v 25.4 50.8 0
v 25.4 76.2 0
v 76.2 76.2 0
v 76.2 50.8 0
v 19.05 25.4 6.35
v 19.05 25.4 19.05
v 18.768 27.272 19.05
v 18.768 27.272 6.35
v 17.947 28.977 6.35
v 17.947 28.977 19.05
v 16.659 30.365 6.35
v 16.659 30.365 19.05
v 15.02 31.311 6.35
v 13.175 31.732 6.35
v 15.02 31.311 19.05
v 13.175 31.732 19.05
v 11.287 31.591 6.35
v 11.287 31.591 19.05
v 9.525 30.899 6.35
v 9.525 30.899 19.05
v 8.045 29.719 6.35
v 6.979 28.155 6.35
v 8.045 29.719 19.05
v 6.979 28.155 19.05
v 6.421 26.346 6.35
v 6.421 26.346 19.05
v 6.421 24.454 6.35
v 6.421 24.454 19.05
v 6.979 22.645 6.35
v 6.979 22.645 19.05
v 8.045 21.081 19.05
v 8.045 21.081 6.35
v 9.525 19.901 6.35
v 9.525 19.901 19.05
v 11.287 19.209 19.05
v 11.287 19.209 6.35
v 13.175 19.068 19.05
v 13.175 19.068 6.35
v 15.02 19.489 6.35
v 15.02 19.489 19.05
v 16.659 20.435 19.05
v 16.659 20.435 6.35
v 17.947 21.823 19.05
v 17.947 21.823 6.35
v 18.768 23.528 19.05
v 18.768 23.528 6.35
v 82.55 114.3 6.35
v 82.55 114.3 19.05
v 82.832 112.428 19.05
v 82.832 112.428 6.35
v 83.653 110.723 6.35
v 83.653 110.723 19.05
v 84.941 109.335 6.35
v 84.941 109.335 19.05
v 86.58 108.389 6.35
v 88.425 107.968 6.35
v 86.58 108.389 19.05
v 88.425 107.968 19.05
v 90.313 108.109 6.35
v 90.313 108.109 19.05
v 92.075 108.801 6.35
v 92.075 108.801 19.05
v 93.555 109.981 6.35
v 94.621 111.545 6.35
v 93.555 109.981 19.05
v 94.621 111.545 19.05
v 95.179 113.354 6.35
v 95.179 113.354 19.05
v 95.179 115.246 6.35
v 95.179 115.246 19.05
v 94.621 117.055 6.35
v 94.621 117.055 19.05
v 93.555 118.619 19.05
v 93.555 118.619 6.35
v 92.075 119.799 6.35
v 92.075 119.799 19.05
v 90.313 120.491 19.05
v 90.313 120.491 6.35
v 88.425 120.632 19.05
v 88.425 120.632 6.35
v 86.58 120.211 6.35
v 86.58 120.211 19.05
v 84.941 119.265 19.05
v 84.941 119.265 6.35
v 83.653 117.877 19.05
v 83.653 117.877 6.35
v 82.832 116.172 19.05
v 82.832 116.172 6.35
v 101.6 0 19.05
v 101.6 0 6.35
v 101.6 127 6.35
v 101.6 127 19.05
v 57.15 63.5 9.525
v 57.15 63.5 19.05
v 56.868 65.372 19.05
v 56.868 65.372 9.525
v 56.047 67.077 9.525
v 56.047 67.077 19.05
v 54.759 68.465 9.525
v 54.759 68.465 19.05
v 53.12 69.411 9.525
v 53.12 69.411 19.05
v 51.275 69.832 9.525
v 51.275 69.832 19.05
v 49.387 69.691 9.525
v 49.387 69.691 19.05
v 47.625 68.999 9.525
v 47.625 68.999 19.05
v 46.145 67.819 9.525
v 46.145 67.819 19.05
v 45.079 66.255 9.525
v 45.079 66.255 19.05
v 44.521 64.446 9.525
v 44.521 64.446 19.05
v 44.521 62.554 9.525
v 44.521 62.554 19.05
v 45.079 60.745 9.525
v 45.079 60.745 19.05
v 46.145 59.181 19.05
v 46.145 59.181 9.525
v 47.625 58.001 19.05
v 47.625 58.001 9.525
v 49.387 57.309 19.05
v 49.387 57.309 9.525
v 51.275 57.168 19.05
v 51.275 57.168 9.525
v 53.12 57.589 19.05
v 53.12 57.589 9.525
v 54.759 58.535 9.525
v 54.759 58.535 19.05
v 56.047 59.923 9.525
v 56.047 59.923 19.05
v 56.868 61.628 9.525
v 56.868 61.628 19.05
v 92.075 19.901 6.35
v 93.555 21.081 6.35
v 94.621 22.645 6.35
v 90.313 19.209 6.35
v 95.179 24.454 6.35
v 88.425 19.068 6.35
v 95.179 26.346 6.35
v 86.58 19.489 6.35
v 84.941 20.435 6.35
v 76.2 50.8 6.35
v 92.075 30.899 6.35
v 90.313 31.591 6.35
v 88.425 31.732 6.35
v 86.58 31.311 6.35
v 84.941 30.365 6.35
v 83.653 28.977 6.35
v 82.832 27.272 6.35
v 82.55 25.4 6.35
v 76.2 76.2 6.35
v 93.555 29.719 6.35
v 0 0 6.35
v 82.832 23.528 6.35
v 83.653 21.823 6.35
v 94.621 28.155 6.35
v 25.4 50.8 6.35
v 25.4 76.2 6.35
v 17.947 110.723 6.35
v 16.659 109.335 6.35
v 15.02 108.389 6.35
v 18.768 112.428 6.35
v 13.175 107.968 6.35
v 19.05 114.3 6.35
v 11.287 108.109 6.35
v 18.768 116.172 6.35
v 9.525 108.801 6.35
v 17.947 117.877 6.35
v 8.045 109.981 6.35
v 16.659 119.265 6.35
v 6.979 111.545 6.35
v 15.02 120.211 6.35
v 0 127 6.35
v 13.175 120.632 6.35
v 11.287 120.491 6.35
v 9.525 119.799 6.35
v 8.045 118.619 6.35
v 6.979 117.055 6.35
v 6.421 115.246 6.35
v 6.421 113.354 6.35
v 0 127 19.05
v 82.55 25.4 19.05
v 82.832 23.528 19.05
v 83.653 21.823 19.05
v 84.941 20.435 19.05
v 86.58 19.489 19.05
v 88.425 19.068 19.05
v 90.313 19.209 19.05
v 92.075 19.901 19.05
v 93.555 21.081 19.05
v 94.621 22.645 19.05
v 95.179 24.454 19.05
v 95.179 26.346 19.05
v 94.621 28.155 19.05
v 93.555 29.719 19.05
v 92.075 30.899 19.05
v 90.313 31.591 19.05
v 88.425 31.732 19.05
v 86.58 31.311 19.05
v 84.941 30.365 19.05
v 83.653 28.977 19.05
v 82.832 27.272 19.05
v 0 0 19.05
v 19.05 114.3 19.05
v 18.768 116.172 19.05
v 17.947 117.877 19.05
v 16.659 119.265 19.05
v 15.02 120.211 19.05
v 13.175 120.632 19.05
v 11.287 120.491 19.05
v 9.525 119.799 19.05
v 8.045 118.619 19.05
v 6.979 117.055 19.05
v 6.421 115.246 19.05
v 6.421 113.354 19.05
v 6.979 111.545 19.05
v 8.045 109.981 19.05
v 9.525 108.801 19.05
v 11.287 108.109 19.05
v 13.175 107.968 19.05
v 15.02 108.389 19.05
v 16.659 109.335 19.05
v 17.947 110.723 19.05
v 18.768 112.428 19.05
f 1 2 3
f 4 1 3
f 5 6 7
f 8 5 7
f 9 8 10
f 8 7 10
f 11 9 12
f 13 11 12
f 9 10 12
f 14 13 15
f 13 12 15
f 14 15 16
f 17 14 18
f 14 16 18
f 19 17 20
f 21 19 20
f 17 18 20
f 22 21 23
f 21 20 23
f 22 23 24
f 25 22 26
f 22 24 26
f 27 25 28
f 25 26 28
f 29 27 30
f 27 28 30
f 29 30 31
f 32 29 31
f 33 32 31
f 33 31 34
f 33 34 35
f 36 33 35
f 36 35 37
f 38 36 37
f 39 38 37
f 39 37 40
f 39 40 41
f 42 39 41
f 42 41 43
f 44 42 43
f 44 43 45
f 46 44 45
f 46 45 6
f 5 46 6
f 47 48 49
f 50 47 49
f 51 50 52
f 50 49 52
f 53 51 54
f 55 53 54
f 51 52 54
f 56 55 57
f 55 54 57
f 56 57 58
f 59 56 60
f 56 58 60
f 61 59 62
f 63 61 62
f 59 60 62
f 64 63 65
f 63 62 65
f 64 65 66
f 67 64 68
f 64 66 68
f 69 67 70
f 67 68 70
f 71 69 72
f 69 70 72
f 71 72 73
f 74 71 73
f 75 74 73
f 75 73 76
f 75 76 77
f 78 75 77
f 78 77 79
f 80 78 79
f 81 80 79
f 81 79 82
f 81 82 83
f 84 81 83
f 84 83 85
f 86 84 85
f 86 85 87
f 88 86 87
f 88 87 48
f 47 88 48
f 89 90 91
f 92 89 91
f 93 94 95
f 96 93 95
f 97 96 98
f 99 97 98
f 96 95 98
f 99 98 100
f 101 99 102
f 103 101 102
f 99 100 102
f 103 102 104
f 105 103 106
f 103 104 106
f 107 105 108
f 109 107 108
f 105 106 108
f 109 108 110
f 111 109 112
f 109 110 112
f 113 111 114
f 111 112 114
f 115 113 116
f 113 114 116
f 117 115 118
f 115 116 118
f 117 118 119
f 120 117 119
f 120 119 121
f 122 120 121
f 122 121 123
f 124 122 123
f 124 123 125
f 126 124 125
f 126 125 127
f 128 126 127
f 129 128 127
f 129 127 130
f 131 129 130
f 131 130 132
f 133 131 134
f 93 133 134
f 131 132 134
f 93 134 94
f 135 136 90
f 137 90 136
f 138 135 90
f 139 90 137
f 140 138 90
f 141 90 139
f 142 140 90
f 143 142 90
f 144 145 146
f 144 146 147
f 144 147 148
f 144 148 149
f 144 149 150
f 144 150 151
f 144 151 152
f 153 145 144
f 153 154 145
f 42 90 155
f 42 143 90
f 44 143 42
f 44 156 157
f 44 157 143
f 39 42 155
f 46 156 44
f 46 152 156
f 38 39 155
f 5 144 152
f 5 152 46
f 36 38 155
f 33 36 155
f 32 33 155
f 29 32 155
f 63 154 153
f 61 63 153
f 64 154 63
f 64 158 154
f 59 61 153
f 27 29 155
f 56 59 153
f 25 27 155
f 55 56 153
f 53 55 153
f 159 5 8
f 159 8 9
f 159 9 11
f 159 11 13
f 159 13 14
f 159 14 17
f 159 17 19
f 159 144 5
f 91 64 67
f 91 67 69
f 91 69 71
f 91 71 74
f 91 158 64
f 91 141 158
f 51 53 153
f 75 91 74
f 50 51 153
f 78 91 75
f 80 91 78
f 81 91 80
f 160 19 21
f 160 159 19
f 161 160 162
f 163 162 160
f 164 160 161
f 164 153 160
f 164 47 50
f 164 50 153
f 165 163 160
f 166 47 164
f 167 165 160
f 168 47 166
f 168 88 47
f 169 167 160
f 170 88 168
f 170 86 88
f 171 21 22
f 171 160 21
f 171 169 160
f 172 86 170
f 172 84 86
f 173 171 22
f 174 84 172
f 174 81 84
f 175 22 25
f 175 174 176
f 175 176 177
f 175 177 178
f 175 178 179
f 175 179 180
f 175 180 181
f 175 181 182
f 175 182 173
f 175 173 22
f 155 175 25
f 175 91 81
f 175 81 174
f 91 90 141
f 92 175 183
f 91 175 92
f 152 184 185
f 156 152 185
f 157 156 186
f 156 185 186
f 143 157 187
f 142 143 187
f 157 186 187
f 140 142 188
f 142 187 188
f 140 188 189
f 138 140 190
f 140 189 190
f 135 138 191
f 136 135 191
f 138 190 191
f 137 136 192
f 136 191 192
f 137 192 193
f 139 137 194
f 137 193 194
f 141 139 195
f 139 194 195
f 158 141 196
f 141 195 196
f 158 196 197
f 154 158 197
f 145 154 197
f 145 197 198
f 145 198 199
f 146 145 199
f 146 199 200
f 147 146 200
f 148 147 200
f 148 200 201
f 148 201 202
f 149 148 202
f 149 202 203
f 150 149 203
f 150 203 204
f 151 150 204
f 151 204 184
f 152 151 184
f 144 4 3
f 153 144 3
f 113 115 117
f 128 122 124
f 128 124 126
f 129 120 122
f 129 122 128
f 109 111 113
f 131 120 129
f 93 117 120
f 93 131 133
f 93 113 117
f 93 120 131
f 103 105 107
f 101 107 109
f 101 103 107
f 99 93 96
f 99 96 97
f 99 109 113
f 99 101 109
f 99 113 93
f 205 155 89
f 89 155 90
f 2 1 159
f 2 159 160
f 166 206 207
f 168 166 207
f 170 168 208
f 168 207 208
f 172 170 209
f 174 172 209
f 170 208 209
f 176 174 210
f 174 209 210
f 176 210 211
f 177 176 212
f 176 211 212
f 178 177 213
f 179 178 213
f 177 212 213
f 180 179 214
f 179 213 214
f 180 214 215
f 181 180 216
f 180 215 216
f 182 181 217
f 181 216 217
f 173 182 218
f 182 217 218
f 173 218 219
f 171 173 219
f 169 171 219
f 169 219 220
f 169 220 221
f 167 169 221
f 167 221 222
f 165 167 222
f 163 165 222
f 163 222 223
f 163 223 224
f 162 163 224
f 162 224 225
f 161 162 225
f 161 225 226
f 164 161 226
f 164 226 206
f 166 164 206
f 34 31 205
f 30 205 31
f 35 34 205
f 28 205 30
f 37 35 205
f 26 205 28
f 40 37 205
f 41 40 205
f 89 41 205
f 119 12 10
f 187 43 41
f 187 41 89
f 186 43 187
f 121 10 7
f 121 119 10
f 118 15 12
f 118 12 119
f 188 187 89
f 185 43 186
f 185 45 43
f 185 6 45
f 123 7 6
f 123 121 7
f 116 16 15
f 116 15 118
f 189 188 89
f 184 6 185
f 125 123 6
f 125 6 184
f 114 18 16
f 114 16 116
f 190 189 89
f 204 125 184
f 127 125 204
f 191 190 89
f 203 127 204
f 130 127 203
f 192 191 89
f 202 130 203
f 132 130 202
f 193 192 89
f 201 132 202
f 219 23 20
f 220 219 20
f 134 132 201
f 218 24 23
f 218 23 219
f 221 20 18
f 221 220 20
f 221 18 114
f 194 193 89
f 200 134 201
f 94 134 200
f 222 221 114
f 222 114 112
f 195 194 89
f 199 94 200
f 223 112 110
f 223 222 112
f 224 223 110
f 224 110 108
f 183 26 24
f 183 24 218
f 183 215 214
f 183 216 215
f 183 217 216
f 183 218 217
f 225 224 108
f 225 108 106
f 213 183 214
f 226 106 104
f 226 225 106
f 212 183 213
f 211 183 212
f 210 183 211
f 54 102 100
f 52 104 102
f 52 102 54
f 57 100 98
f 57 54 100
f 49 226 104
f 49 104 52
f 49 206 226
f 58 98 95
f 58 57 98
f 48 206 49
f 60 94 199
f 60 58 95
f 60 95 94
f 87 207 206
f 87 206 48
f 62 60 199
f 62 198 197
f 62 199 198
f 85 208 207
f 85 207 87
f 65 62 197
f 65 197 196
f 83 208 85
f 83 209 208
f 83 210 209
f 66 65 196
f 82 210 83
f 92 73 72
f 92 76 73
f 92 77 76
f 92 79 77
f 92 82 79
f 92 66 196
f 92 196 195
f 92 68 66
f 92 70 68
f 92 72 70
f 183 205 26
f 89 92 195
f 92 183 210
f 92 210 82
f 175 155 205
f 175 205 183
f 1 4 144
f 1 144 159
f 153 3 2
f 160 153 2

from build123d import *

# Parameters (mm, degrees)
SKETCH1_W           = 101.6
SKETCH1_H           = 127
BOSS_EXTRUDE1_DEPTH = 19.05
SKETCH2_W           = 25.4
SKETCH2_H           = 127
CUT_EXTRUDE1_DEPTH  = 6.35
CUT_EXTRUDE2_REACH  = 165.751
SKETCH4_R           = 6.35
SKETCH9_W           = 50.8
SKETCH9_H           = 50.8
CUT_EXTRUDE7_DEPTH  = 6.35
SKETCH11_R          = 6.35
CUT_EXTRUDE8_DEPTH  = 9.525


with BuildPart() as part:
    # Sketch1 → Boss-Extrude1 (new body)
    with BuildSketch(Plane.XY):
        with Locations((50.8, 63.5)):
            Rectangle(SKETCH1_W, SKETCH1_H)
    extrude(amount=BOSS_EXTRUDE1_DEPTH)

    # Sketch2 → Cut-Extrude1 (cut)
    with BuildSketch(Plane(origin=(0, 0, 0), x_dir=(-1, 0, 0), z_dir=(0, 0, -1))):
        with Locations((-88.9, 63.5)):
            Rectangle(SKETCH2_W, SKETCH2_H)
        with Locations((-12.7, 63.5)):
            Rectangle(SKETCH2_W, SKETCH2_H)
    extrude(amount=-CUT_EXTRUDE1_DEPTH, mode=Mode.SUBTRACT)

    # Sketch4 → Cut-Extrude2 (cut, up to next)
    with BuildSketch(Plane.XY.offset(19.05), mode=Mode.PRIVATE) as cut_extrude2_sk1:
        with Locations((12.7, 114.3)):
            Circle(SKETCH4_R)
    cut_extrude2_tool1 = extrude(cut_extrude2_sk1.sketch, amount=-CUT_EXTRUDE2_REACH, mode=Mode.PRIVATE) & part.part
    # Sketch4 → Cut-Extrude2 (cut, up to next)
    with BuildSketch(Plane.XY.offset(19.05), mode=Mode.PRIVATE) as cut_extrude2_sk2:
        with Locations((12.7, 25.4)):
            Circle(SKETCH4_R)
    cut_extrude2_tool2 = extrude(cut_extrude2_sk2.sketch, amount=-CUT_EXTRUDE2_REACH, mode=Mode.PRIVATE) & part.part
    # Sketch4 → Cut-Extrude2 (cut, up to next)
    with BuildSketch(Plane.XY.offset(19.05), mode=Mode.PRIVATE) as cut_extrude2_sk3:
        with Locations(Location((88.9, 25.4, 0), (0, 0, 180))):
            Circle(SKETCH4_R)
    cut_extrude2_tool3 = extrude(cut_extrude2_sk3.sketch, amount=-CUT_EXTRUDE2_REACH, mode=Mode.PRIVATE) & part.part
    # Sketch4 → Cut-Extrude2 (cut, up to next)
    with BuildSketch(Plane.XY.offset(19.05), mode=Mode.PRIVATE) as cut_extrude2_sk4:
        with Locations(Location((88.9, 114.3, 0), (0, 0, 180))):
            Circle(SKETCH4_R)
    cut_extrude2_tool4 = extrude(cut_extrude2_sk4.sketch, amount=-CUT_EXTRUDE2_REACH, mode=Mode.PRIVATE) & part.part
    add(cut_extrude2_tool1.solids().sort_by_distance((12.7, 114.3, 19.05))[0], mode=Mode.SUBTRACT)
    add(cut_extrude2_tool2.solids().sort_by_distance((12.7, 25.4, 19.05))[0], mode=Mode.SUBTRACT)
    add(cut_extrude2_tool3.solids().sort_by_distance((88.9, 25.4, 19.05))[0], mode=Mode.SUBTRACT)
    add(cut_extrude2_tool4.solids().sort_by_distance((88.9, 114.3, 19.05))[0], mode=Mode.SUBTRACT)

    # Sketch9 → Cut-Extrude7 (cut)
    with BuildSketch(Plane(origin=(0, 0, 0), x_dir=(-1, 0, 0), z_dir=(0, 0, -1))):
        with Locations((-50.8, 25.4)):
            Rectangle(SKETCH9_W, SKETCH9_H)
        with Locations((-50.8, 101.6)):
            Rectangle(SKETCH9_W, SKETCH9_H)
    extrude(amount=-CUT_EXTRUDE7_DEPTH, mode=Mode.SUBTRACT)

    # Sketch11 → Cut-Extrude8 (cut)
    with BuildSketch(Plane.XY.offset(19.05)):
        with Locations((50.8, 63.5)):
            Circle(SKETCH11_R)
    extrude(amount=-CUT_EXTRUDE8_DEPTH, mode=Mode.SUBTRACT)


solid = part.part
